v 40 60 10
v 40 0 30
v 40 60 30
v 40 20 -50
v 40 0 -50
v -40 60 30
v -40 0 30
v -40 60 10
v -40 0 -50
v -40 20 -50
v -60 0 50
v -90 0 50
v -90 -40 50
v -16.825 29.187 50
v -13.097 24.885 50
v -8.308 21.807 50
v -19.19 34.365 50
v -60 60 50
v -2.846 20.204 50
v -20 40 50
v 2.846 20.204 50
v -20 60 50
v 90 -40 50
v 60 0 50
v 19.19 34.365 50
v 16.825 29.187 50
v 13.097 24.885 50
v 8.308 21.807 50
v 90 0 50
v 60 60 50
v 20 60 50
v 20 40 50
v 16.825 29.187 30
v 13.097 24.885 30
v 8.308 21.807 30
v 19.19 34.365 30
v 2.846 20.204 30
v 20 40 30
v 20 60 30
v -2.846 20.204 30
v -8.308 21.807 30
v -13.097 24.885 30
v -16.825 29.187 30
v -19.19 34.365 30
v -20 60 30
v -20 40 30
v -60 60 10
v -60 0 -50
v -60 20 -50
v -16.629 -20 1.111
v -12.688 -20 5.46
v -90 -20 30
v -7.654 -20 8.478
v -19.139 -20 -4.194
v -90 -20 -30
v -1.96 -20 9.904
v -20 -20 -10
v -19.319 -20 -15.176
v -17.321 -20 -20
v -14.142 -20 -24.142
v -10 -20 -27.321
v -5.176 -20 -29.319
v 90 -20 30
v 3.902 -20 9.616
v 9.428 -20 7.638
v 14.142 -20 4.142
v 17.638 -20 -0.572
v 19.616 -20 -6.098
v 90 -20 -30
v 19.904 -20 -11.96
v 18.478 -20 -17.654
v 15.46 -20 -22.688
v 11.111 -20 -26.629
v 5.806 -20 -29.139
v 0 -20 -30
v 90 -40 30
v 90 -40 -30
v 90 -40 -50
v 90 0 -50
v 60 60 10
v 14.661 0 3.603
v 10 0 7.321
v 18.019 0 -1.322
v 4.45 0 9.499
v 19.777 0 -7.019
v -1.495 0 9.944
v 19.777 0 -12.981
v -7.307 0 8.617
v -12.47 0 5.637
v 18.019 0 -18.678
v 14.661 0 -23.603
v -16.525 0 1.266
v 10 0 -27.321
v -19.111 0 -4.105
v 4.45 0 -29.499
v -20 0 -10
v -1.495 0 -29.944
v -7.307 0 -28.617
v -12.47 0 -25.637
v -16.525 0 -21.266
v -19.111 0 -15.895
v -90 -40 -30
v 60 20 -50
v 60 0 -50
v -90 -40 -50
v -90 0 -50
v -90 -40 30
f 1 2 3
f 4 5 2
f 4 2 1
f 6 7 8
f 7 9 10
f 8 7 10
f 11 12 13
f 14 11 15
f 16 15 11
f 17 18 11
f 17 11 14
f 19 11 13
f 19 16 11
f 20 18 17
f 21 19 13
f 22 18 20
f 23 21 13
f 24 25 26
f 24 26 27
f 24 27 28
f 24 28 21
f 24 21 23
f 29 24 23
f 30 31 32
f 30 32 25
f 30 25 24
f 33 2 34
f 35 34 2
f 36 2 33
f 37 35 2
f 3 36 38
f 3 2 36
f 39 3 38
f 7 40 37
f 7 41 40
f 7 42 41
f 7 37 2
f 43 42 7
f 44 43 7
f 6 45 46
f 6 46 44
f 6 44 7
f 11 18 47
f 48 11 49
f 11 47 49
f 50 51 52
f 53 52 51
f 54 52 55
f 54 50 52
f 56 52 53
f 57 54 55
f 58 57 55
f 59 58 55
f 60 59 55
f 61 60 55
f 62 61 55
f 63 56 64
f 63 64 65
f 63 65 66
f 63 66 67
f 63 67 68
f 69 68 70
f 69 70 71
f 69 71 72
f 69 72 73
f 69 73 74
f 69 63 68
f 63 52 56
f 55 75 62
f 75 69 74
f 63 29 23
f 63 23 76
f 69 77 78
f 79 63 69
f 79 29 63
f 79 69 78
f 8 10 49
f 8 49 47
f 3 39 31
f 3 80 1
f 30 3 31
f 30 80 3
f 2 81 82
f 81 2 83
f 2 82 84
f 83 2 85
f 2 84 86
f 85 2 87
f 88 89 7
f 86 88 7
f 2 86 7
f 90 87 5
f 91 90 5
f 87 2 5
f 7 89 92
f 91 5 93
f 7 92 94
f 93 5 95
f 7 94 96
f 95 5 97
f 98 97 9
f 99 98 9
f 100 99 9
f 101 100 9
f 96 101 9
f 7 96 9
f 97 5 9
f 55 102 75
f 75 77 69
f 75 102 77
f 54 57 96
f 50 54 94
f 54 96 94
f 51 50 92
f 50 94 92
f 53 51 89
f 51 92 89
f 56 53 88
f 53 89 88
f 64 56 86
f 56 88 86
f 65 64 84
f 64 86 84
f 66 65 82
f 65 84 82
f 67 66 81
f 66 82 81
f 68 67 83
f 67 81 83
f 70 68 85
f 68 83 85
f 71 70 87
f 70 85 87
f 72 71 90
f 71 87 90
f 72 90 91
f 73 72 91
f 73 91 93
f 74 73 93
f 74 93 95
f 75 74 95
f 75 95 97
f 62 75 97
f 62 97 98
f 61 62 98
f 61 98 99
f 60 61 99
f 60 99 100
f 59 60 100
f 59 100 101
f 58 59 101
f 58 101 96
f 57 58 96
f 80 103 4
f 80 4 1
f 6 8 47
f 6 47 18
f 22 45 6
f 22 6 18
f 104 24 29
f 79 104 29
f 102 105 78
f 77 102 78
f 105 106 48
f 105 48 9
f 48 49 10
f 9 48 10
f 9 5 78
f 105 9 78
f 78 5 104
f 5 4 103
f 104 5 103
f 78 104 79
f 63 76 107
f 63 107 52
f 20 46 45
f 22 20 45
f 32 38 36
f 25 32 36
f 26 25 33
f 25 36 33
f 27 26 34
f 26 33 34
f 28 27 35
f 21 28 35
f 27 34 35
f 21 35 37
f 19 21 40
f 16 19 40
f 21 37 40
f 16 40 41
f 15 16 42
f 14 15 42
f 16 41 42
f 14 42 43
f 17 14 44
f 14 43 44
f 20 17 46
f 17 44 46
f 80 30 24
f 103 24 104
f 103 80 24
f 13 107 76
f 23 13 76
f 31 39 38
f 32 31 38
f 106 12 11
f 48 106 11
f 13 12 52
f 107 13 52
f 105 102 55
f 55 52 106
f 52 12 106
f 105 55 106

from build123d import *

# Parameters (mm, degrees)
SKETCH2_W           = 180
SKETCH2_H           = 100
BOSS_EXTRUDE2_DEPTH = 40
BOSS_EXTRUDE3_DEPTH = 60
SKETCH7_W           = 60
SKETCH7_H           = 40
CUT_EXTRUDE1_DEPTH  = 197.214168703
SKETCH15_W          = 80
SKETCH15_H          = 60
CUT_EXTRUDE2_DEPTH  = 80
CUT_EXTRUDE3_DEPTH  = 20
SKETCH20_R          = 20
CUT_EXTRUDE5_DEPTH  = 20


with BuildPart() as part:
    # Sketch2 → Boss-Extrude2 (new body)
    with BuildSketch(Plane(origin=(0, 0, 0), x_dir=(1, 0, 0), z_dir=(0, 1, 0))):
        Rectangle(SKETCH2_W, SKETCH2_H)
    extrude(amount=-BOSS_EXTRUDE2_DEPTH)

    # Sketch6 → Boss-Extrude3 (add, symmetric)
    with BuildSketch(Plane(origin=(0, 0, 0), x_dir=(0, 0, -1), z_dir=(1, 0, 0))):
        Polygon((50, 0), (50, 20), (-10, 60), (-50, 60), (-50, 0), align=None)
    extrude(amount=BOSS_EXTRUDE3_DEPTH, both=True)

    # Sketch7 → Cut-Extrude1 (cut, through all)
    with BuildSketch(Plane(origin=(90, 0, 0), x_dir=(0, 0, -1), z_dir=(1, 0, 0))):
        with Locations((0, -40)):
            Rectangle(SKETCH7_W, SKETCH7_H)
    extrude(amount=-CUT_EXTRUDE1_DEPTH, mode=Mode.SUBTRACT)

    # Sketch15 → Cut-Extrude2 (cut)
    with BuildSketch(Plane(origin=(0, 0, -50), x_dir=(-1, 0, 0), z_dir=(0, 0, -1))):
        with Locations((0, 30)):
            Rectangle(SKETCH15_W, SKETCH15_H)
    extrude(amount=-CUT_EXTRUDE2_DEPTH, mode=Mode.SUBTRACT)

    # Sketch16 → Cut-Extrude3 (cut)
    with BuildSketch(Plane(origin=(0, 0, 30), x_dir=(-1, 0, 0), z_dir=(0, 0, -1))):
        Polygon((20, 80), (-20, 80), (-20, 60), (1.28e-07, 60), (20, 60), align=None)
        with BuildLine():
            Line((1.28e-07, 60), (-20, 60))
            Line((-20, 60), (-20, 40))
            ThreePointArc((-20, 40), (-14.142135579, 54.142135669), (1.28e-07, 60))
        make_face()
        with BuildLine():
            ThreePointArc((1.28e-07, 60), (-14.142135579, 54.142135669), (-20, 40))
            Line((-20, 40), (20, 40))
            ThreePointArc((20, 40), (14.142135669, 54.142135579), (1.28e-07, 60))
        make_face()
        with BuildLine():
            Line((20, 40), (-20, 40))
            ThreePointArc((-20, 40), (0, 20), (20, 40))
        make_face()
        with BuildLine():
            Line((20, 40), (20, 60))
            Line((20, 60), (1.28e-07, 60))
            ThreePointArc((1.28e-07, 60), (14.142135669, 54.142135579), (20, 40))
        make_face()
    extrude(amount=-CUT_EXTRUDE3_DEPTH, mode=Mode.SUBTRACT)

    # Sketch20 → Cut-Extrude5 (cut)
    with BuildSketch(Plane(origin=(0, 0, 0), x_dir=(1, 0, 0), z_dir=(0, 1, 0))):
        with Locations(Location((0, 10, 0), (0, 0, 180))):
            Circle(SKETCH20_R)
    extrude(amount=-CUT_EXTRUDE5_DEPTH, mode=Mode.SUBTRACT)


solid = part.part
